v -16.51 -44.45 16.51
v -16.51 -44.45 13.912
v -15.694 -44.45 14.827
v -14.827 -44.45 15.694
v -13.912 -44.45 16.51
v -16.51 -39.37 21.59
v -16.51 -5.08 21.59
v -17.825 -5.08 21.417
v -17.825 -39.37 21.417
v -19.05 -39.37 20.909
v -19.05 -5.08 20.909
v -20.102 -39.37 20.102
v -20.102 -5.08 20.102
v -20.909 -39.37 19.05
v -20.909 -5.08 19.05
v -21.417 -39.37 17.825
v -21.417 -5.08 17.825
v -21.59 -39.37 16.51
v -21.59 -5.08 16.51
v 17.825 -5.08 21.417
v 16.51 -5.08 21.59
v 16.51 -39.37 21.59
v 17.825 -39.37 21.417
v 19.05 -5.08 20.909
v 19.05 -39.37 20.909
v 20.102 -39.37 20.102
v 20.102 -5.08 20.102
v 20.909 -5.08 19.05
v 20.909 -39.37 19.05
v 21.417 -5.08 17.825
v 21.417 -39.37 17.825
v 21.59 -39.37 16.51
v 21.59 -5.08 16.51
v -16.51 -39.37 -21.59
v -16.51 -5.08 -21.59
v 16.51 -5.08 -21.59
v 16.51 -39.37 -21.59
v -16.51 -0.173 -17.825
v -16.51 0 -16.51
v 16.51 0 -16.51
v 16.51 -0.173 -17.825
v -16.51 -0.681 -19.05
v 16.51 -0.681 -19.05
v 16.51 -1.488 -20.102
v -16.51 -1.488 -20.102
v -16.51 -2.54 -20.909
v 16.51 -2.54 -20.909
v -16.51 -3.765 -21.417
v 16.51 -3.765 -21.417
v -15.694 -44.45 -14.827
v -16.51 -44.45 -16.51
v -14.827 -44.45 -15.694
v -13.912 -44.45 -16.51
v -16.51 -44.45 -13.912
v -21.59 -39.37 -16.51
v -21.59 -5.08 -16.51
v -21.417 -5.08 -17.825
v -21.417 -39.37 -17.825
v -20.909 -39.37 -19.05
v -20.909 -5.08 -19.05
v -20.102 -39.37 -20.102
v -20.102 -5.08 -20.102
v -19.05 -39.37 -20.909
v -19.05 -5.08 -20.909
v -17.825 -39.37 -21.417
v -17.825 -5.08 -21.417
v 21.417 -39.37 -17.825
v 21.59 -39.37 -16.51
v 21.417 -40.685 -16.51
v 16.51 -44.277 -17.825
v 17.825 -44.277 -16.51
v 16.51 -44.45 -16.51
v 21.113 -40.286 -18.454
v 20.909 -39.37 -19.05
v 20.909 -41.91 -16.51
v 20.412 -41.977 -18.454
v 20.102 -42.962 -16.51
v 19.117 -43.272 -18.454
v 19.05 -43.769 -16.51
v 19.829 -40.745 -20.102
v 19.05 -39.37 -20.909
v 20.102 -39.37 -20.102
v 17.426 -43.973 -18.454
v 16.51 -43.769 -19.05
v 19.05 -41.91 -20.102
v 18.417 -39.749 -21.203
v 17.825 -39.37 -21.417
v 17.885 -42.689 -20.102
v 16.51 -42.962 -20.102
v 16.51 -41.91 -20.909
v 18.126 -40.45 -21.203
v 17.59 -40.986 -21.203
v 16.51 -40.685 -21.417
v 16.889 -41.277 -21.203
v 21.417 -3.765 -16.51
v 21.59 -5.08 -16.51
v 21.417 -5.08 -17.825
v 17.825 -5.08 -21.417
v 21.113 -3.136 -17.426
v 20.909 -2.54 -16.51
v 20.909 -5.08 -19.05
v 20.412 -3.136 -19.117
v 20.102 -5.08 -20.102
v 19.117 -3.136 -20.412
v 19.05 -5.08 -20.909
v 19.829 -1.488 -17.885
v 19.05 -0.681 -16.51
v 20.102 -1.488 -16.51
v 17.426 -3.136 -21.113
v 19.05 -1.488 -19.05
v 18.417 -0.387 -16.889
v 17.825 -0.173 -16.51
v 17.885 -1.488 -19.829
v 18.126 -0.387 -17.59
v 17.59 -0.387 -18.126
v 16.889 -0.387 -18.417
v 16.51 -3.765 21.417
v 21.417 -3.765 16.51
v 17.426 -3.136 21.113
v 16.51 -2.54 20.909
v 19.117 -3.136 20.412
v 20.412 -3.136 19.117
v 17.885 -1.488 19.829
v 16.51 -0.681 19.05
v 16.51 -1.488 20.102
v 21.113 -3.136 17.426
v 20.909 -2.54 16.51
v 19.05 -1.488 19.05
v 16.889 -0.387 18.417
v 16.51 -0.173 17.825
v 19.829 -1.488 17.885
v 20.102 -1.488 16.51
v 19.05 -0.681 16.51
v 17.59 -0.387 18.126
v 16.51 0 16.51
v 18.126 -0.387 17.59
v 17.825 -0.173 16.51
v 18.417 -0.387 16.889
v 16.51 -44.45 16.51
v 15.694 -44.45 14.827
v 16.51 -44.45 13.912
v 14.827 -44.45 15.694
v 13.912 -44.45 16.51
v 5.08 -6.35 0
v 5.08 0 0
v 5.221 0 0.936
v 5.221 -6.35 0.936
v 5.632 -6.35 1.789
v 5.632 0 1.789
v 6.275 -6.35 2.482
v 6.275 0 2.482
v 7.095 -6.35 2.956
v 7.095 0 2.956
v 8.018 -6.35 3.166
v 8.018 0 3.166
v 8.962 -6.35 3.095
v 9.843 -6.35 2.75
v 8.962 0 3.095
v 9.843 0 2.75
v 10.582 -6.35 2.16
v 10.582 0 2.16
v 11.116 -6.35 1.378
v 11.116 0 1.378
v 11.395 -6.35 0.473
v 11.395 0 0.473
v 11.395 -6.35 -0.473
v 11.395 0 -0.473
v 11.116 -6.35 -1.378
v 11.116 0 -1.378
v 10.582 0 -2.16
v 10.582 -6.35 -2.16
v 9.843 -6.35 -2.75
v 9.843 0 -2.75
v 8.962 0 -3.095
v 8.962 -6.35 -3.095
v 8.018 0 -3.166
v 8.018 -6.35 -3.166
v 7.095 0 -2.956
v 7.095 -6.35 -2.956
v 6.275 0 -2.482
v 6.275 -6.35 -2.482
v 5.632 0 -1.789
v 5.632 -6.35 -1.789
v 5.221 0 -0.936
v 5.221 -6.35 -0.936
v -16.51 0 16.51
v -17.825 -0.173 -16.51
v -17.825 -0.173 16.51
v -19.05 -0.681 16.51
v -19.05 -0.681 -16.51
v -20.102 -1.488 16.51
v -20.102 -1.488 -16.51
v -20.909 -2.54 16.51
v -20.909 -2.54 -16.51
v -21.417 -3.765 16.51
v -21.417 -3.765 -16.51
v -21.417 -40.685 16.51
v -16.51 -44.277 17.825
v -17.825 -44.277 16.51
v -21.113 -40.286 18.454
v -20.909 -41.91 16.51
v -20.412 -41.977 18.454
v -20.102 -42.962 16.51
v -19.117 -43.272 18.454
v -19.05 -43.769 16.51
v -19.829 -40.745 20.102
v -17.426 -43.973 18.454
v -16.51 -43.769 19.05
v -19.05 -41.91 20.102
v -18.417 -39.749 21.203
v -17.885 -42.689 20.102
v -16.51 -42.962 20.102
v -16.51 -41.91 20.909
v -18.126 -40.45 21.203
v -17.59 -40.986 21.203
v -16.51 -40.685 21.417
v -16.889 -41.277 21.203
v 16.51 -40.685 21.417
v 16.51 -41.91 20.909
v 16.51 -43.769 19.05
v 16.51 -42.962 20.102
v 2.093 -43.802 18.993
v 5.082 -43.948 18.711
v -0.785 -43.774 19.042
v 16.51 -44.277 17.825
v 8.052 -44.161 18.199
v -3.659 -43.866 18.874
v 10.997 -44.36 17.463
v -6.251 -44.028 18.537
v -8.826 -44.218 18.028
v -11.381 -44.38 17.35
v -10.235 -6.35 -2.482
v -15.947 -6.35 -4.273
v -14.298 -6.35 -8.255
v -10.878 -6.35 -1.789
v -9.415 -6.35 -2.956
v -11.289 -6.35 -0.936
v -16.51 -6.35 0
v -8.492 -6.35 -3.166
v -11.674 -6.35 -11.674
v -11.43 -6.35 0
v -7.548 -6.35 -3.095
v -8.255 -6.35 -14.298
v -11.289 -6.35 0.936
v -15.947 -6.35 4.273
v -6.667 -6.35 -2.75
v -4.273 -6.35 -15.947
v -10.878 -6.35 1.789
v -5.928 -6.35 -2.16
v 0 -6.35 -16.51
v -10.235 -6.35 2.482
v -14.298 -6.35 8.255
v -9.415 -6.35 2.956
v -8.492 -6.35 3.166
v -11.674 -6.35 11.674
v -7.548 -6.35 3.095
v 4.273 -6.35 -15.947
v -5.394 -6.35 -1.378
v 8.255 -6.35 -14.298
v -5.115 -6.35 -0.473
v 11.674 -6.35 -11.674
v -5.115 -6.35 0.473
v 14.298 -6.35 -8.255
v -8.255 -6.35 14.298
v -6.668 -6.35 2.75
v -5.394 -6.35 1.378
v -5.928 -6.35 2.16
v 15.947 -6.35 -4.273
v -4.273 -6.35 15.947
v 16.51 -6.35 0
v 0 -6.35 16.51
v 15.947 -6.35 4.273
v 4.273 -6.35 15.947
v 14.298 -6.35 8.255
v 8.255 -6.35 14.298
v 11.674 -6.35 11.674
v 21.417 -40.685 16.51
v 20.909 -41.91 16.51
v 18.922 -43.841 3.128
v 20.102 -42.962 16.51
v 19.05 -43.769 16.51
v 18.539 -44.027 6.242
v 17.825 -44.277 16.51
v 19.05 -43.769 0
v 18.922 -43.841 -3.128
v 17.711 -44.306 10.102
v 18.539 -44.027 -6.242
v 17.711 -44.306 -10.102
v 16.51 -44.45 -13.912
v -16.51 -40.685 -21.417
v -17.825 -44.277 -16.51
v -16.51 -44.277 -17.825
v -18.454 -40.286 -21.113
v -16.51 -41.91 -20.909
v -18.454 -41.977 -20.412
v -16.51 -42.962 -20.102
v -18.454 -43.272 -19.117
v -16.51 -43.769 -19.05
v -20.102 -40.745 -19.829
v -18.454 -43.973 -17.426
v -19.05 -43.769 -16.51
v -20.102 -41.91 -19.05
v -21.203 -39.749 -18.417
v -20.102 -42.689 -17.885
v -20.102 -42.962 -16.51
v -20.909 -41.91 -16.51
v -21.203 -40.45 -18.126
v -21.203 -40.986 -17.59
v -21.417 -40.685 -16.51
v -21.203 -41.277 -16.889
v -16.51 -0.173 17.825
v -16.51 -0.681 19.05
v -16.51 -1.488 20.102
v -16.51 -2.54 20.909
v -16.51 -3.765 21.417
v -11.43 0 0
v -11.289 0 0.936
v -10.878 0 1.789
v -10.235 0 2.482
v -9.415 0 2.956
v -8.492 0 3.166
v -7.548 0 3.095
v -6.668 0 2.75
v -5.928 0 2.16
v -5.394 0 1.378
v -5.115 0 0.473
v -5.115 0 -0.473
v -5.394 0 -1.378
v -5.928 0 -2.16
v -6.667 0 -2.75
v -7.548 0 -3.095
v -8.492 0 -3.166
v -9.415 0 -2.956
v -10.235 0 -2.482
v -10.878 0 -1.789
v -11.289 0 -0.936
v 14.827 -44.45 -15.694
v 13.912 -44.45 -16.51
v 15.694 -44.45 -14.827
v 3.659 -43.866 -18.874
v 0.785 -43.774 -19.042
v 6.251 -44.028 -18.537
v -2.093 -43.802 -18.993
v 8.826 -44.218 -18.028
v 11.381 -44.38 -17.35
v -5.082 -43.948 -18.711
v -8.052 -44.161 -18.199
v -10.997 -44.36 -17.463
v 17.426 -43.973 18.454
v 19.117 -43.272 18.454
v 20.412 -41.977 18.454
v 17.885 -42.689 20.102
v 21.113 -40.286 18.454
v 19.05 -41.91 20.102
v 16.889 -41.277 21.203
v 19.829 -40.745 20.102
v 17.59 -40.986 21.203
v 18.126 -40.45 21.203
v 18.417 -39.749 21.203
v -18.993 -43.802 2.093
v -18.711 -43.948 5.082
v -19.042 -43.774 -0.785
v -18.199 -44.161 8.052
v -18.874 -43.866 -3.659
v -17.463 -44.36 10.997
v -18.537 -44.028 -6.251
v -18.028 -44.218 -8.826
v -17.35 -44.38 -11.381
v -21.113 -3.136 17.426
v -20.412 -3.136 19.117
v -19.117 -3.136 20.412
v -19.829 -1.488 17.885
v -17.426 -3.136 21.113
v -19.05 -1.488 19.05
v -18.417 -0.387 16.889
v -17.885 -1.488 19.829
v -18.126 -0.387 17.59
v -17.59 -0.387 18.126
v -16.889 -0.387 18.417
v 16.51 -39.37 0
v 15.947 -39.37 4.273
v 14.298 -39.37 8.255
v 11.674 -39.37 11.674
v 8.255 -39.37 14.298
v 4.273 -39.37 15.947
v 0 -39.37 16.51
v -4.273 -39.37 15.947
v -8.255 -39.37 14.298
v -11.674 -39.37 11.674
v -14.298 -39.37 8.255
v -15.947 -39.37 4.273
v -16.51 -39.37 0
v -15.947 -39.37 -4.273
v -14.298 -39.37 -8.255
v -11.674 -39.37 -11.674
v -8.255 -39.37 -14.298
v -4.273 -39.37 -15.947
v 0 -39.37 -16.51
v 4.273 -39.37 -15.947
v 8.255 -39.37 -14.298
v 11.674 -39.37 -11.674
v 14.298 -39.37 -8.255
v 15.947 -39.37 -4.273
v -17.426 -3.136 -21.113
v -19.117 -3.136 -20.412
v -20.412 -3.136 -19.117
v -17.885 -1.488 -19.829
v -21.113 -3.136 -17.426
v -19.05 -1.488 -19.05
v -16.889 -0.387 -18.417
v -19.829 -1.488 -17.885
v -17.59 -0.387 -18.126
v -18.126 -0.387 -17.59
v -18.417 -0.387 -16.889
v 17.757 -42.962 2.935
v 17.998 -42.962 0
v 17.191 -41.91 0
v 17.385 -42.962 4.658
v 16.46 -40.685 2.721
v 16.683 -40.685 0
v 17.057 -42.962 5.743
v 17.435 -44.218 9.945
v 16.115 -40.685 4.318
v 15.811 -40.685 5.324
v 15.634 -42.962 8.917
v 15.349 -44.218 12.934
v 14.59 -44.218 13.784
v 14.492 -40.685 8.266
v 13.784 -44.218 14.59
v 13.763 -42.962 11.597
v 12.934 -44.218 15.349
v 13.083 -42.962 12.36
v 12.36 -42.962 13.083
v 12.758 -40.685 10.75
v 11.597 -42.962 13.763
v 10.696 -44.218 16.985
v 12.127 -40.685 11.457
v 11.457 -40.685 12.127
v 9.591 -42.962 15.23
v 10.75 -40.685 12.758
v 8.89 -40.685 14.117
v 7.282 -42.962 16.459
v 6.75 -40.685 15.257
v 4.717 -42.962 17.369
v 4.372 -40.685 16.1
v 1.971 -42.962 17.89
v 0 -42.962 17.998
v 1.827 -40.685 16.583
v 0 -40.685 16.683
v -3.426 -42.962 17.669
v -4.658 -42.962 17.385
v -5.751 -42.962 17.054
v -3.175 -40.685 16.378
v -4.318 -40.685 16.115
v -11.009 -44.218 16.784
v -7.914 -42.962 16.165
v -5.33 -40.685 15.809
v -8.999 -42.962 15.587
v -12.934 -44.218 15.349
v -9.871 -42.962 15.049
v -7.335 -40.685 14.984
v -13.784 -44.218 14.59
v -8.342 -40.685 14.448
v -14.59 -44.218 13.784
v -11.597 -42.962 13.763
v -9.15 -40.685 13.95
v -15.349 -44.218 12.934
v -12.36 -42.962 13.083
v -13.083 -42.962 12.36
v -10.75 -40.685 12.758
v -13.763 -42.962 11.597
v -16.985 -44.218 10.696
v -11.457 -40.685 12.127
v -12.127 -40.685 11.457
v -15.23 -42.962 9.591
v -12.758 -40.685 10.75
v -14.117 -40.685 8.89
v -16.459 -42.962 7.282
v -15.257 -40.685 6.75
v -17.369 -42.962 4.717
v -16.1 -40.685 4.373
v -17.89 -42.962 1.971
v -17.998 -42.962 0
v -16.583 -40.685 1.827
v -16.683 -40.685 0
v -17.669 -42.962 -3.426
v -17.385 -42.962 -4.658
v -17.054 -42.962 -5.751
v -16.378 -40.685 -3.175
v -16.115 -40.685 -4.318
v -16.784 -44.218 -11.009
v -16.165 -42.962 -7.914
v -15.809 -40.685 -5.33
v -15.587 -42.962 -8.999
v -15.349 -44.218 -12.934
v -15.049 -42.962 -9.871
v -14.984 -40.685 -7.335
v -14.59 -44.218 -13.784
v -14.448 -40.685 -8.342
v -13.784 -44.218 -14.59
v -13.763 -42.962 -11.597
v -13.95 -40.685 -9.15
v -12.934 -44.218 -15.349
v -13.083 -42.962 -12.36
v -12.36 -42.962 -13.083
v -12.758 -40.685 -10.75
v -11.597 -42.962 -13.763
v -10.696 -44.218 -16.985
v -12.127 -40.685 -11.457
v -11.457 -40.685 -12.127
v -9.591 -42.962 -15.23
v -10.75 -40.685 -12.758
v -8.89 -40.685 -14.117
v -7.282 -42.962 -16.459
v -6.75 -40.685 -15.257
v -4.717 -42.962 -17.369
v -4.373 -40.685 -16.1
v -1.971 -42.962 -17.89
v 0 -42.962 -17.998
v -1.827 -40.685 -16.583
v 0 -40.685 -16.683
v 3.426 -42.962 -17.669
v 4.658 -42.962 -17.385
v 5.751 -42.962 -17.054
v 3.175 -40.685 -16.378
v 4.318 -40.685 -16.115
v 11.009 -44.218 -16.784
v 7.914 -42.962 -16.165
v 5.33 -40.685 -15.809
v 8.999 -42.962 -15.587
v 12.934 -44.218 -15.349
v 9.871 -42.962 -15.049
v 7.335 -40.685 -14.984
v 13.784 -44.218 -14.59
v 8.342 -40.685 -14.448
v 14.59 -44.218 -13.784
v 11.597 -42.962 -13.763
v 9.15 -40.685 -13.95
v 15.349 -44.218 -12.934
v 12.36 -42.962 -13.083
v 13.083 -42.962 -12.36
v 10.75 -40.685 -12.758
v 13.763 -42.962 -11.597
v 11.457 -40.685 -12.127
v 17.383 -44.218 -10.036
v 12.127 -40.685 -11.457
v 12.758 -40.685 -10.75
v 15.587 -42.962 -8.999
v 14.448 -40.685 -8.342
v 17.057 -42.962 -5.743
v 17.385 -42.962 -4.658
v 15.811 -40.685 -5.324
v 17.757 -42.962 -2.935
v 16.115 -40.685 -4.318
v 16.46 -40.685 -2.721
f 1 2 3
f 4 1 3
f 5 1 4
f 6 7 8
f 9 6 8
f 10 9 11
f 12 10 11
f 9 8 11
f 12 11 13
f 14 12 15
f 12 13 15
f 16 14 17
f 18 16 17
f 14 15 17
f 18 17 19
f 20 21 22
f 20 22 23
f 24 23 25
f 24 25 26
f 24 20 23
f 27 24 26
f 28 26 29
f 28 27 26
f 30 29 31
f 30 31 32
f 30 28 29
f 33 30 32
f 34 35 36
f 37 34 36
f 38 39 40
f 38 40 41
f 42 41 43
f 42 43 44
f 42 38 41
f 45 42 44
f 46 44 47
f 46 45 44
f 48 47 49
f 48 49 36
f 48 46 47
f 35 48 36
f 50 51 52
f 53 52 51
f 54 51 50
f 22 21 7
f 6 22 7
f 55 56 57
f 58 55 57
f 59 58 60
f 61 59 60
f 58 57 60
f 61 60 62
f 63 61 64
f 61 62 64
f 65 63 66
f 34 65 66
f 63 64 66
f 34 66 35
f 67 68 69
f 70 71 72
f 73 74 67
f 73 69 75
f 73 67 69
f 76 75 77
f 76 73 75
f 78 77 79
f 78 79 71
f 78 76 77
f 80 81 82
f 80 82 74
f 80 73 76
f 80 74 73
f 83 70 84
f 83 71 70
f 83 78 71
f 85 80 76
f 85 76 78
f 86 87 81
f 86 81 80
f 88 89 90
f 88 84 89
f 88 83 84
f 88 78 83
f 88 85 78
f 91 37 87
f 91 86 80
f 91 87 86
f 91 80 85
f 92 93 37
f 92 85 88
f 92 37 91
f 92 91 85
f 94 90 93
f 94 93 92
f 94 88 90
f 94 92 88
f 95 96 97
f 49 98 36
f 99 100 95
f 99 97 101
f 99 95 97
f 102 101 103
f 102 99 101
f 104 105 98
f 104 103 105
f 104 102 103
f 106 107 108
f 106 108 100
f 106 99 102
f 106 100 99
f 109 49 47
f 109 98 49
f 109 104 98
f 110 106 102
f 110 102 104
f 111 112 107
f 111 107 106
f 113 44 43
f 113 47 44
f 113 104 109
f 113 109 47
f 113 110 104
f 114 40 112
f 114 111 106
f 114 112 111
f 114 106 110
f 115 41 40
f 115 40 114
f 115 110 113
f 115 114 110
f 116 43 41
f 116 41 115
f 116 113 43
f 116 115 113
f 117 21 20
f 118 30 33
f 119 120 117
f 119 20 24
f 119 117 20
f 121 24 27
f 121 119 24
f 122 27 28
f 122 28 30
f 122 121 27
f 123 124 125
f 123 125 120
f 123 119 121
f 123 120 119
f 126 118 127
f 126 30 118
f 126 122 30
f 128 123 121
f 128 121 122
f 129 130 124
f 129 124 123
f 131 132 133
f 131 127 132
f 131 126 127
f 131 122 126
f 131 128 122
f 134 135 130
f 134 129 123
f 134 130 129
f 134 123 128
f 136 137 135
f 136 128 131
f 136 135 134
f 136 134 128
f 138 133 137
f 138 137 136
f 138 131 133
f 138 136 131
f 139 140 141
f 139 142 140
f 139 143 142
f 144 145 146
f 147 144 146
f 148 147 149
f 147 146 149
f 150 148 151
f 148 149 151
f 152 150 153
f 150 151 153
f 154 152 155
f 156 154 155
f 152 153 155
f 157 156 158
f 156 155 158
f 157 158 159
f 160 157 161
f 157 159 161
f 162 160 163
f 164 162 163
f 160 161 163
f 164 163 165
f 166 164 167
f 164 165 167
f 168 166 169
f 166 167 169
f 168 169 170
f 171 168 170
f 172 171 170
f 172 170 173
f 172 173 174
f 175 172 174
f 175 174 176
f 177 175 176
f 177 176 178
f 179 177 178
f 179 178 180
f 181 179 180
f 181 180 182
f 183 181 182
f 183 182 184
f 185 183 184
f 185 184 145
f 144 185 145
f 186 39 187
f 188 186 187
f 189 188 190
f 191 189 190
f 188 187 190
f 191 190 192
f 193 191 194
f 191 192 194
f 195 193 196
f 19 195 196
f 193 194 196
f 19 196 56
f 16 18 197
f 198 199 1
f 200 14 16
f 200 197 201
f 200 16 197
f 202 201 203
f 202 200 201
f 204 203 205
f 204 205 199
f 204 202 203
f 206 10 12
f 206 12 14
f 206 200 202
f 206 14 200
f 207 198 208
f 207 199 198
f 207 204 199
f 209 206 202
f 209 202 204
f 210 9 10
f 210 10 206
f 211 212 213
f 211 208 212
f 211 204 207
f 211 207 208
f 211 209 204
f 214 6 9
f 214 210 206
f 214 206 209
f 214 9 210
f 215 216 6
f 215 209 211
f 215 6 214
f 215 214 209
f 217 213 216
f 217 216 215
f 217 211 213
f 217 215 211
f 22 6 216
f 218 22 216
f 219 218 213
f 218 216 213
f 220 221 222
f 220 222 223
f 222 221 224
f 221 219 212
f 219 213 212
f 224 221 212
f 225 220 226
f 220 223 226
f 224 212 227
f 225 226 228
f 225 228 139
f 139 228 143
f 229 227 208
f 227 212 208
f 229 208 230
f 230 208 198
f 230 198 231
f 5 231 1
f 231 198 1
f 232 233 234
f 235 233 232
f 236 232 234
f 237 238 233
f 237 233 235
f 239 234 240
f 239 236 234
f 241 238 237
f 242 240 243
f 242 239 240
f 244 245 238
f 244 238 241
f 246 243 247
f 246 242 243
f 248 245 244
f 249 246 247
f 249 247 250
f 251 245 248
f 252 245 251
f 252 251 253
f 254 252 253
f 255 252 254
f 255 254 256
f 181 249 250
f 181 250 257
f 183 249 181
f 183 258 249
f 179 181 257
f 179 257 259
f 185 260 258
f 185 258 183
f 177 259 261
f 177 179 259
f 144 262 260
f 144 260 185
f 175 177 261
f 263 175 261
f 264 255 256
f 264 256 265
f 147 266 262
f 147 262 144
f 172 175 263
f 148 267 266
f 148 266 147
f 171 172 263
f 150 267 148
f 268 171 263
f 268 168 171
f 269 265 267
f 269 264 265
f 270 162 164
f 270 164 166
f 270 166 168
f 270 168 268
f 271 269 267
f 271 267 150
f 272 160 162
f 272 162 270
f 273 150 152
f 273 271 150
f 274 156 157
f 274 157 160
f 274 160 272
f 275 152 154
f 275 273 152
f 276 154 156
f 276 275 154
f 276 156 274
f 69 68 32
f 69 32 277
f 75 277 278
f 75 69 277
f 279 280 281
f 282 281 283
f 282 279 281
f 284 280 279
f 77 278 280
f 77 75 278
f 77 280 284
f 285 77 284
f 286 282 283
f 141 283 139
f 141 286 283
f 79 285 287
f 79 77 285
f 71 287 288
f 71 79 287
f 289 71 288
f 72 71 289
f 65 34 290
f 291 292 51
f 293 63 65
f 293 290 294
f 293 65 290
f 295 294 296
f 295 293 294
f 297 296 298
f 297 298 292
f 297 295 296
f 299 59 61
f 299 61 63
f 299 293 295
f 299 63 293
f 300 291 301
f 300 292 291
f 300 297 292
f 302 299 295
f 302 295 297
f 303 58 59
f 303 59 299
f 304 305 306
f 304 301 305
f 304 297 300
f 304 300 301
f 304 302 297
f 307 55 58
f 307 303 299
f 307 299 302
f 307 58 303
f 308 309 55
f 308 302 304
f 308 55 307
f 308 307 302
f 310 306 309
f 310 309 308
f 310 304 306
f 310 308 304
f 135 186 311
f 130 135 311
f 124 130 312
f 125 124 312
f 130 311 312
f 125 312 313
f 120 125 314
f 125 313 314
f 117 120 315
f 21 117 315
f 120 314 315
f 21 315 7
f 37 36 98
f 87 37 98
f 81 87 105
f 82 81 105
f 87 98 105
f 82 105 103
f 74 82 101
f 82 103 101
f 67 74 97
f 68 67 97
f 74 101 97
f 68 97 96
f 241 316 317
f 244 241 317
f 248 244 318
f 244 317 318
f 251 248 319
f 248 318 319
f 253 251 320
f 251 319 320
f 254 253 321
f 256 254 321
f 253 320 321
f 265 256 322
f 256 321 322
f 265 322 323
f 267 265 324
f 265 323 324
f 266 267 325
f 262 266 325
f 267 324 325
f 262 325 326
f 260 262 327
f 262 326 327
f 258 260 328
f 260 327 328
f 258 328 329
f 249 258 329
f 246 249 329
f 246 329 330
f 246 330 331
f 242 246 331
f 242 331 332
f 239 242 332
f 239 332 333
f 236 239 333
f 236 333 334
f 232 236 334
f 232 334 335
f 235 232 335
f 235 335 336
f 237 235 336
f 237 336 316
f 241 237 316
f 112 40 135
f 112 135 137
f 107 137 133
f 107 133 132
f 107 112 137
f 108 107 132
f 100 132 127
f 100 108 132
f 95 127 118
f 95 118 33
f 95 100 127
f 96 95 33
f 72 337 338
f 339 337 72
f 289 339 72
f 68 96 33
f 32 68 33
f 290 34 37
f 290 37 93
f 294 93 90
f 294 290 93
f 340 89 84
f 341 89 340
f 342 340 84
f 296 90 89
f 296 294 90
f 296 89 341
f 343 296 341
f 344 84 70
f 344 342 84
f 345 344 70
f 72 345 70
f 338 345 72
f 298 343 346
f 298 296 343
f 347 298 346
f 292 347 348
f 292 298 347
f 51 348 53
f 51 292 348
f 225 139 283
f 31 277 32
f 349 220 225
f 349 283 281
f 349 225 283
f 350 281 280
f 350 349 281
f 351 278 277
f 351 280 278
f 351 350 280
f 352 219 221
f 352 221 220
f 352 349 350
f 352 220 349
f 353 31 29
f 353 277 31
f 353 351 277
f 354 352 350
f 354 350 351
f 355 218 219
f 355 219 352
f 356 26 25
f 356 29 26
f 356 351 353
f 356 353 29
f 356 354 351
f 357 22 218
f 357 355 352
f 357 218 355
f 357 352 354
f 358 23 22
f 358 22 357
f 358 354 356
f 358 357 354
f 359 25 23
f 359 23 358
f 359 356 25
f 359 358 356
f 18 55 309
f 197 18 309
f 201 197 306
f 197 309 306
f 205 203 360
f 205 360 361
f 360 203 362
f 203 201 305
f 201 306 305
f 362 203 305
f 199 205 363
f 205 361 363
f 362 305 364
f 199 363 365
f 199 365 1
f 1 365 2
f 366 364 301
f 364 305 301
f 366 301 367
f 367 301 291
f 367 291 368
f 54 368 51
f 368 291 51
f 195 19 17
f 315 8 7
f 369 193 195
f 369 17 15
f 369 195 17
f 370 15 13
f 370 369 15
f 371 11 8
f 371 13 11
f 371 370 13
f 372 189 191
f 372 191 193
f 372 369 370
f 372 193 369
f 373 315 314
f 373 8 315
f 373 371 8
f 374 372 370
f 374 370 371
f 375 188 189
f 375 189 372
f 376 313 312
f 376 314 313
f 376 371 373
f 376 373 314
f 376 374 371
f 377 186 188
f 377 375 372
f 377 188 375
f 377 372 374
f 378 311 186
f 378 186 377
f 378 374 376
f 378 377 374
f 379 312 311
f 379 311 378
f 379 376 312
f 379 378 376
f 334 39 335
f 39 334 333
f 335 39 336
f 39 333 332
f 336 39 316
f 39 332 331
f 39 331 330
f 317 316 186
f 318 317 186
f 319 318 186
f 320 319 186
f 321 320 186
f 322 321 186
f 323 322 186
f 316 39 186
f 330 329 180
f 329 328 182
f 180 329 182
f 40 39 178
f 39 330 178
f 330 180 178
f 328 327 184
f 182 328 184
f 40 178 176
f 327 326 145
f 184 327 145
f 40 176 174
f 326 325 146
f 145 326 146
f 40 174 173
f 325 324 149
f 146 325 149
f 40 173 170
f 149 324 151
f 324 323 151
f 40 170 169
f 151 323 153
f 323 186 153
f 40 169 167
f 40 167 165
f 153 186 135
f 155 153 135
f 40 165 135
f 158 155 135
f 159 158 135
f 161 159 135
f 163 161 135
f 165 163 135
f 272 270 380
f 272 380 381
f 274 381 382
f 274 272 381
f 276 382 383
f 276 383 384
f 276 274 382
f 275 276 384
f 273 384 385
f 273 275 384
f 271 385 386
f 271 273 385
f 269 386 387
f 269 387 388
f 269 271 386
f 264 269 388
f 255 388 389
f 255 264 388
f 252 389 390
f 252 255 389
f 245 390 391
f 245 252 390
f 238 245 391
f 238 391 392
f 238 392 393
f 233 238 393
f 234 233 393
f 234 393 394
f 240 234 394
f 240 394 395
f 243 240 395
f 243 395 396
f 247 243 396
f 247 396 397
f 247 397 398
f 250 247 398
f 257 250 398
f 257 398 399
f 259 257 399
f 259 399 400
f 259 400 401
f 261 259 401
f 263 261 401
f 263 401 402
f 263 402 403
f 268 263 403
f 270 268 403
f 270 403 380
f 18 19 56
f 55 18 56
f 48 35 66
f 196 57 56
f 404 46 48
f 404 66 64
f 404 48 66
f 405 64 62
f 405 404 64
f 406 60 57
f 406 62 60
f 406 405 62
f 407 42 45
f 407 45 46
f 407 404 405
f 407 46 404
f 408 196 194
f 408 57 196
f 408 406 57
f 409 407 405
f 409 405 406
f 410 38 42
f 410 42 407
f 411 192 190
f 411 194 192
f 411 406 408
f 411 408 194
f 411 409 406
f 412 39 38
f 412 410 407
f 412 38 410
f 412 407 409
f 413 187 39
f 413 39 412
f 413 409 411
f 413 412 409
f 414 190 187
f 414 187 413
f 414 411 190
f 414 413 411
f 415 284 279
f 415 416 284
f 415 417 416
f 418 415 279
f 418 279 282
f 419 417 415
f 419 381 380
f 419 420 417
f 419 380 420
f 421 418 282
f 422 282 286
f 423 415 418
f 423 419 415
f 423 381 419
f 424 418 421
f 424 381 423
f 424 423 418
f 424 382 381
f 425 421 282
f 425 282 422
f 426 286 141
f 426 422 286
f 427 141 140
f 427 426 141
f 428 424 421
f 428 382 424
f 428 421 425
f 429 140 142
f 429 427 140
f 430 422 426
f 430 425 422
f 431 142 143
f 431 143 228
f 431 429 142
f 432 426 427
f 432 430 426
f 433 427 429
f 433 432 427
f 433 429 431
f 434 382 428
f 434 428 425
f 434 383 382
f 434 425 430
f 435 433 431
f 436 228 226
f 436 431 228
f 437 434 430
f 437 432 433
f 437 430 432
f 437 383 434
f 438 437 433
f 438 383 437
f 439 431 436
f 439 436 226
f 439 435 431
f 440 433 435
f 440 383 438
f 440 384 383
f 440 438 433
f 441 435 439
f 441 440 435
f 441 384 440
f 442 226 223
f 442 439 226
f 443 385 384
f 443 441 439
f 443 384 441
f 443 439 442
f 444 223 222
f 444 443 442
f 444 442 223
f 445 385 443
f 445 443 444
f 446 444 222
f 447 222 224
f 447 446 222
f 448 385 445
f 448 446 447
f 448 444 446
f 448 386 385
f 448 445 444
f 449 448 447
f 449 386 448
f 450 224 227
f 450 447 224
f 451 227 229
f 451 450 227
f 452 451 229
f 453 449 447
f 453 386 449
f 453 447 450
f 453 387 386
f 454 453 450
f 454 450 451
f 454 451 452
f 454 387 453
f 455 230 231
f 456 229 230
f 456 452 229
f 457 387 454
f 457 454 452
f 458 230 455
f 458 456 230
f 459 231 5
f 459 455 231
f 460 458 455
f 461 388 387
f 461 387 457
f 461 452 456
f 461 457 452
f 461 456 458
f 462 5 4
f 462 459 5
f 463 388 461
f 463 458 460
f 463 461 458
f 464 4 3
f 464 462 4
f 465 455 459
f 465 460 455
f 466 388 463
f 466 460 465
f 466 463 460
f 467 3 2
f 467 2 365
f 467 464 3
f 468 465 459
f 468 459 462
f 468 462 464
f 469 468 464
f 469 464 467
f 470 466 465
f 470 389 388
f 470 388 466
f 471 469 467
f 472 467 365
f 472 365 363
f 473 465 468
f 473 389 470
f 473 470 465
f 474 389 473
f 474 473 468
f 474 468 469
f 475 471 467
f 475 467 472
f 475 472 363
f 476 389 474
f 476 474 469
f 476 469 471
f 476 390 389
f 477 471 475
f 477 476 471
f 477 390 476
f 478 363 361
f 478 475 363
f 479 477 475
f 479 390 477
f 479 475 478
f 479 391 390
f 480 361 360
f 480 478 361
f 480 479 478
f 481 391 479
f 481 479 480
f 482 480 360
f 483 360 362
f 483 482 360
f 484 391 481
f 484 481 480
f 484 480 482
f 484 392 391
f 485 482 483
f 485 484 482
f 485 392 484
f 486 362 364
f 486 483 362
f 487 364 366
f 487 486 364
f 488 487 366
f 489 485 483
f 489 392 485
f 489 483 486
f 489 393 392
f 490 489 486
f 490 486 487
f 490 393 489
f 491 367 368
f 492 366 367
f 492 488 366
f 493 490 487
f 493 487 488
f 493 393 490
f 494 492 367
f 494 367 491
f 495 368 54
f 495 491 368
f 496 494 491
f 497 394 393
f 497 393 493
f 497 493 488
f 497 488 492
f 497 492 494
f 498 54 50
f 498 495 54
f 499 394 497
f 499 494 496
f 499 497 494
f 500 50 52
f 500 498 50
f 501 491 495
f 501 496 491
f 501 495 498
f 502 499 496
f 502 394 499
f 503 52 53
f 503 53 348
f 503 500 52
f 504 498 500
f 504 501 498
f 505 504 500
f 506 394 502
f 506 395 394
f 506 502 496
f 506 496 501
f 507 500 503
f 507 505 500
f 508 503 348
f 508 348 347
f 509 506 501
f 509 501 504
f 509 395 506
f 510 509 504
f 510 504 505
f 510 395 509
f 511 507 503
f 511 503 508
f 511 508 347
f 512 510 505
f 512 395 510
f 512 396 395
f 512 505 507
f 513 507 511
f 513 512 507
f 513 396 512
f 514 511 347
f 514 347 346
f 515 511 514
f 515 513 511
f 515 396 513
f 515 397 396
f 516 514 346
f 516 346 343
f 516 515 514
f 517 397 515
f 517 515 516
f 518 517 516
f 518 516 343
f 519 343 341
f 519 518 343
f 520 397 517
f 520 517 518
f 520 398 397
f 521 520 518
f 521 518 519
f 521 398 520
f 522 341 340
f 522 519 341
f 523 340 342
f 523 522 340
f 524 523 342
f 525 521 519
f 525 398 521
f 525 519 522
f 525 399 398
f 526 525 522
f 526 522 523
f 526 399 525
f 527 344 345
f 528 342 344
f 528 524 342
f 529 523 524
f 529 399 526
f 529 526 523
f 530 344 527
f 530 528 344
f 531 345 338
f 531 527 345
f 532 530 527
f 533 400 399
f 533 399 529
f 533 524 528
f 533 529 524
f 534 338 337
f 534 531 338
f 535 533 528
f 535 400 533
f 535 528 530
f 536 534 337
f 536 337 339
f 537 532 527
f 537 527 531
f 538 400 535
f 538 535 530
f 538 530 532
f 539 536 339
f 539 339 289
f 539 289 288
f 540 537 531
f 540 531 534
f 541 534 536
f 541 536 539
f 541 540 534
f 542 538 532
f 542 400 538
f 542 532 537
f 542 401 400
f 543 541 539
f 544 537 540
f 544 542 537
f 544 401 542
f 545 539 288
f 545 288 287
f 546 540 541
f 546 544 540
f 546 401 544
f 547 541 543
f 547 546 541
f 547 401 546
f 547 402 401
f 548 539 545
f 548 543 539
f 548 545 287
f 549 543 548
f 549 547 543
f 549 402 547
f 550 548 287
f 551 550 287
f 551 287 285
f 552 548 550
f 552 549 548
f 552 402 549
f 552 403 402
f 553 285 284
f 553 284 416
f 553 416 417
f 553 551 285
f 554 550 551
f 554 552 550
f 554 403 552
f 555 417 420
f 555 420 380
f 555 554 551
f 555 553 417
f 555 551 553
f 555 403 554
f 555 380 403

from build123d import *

# Parameters (mm, degrees)
F0_R         = 16.51
F1_DEPTH     = 6.35
F2_DEPTH     = 44.45
F3_T1_DEPTH  = 34.29
F3_T3_DEPTH  = 33.02
F3_T5_DEPTH  = 33.02
F3_S9_W      = 5.08
F3_S9_H      = 5.08
F3_T10_DEPTH = 5.08
F3_S15_W     = 5.08
F3_S15_H     = 5.08
F3_T16_DEPTH = 5.08
F3_S21_W     = 5.08
F3_S21_H     = 5.08
F3_T22_DEPTH = 5.08
F3_S27_W     = 5.08
F3_S27_H     = 5.08
F3_T28_DEPTH = 5.08
F3_S33_W     = 5.08
F3_S33_H     = 5.08
F3_T34_DEPTH = 5.08
F3_S39_W     = 5.08
F3_S39_H     = 5.08
F3_T40_DEPTH = 5.08
F3_S45_W     = 5.08
F3_S45_H     = 5.08
F3_T46_DEPTH = 5.08
F3_S51_W     = 5.08
F3_S51_H     = 5.08
F3_T52_DEPTH = 5.08
F4_R         = 3.175
F5_DEPTH     = 25.4


# Not quite as in the source:
# - a fillet or chamfer that OpenCascade refuses, or shapes differently, is made with other operations: its cross-section is extruded or revolved along the edge and cut away or added


with BuildPart() as f1:
    # F0 (on Front) → F1 (new body)
    with BuildSketch(Plane.XZ):
        Circle(F0_R)
    extrude(amount=F1_DEPTH)

    # F0 (on Front) → F2 (join)
    with BuildSketch(Plane.XZ):
        Polygon((21.59, 21.59), (0, 21.59), (-21.59, 21.59), (-21.59, 0), (-21.59, -21.59), (21.59, -21.59), align=None)
        Circle(F0_R, mode=Mode.SUBTRACT)
    extrude(amount=F2_DEPTH)

    # F3: fillet of radius 5.08 on 13 edges, made by hand

    # F3_s2 → F3_t1 (cut)
    with BuildSketch(Plane.XZ.offset(5.08)):
        with BuildLine():
            ThreePointArc((16.51, 21.59), (20.1021024484, 20.1021024484), (21.59, 16.51))
            Line((21.59, 16.51), (21.59, 21.59))
            Line((21.59, 21.59), (16.51, 21.59))
        make_face()
        with BuildLine():
            ThreePointArc((-16.51, 21.59), (-20.1021024484, 20.1021024484), (-21.59, 16.51))
            Line((-21.59, 16.51), (-21.59, 21.59))
            Line((-21.59, 21.59), (-16.51, 21.59))
        make_face()
        with BuildLine():
            ThreePointArc((-21.59, -16.51), (-20.1021024484, -20.1021024484), (-16.51, -21.59))
            Line((-16.51, -21.59), (-21.59, -21.59))
            Line((-21.59, -21.59), (-21.59, -16.51))
        make_face()
        with BuildLine():
            ThreePointArc((16.51, -21.59), (20.1021024484, -20.1021024484), (21.59, -16.51))
            Line((21.59, -16.51), (21.59, -21.59))
            Line((21.59, -21.59), (16.51, -21.59))
        make_face()
    extrude(amount=F3_T1_DEPTH, mode=Mode.SUBTRACT)

    # F3_s4 → F3_t3 (cut)
    with BuildSketch(Plane.YZ.offset(-16.51)):
        with BuildLine():
            ThreePointArc((0, -16.51), (-1.4878975516, -20.1021024484), (-5.08, -21.59))
            Line((-5.08, -21.59), (0, -21.59))
            Line((0, -21.59), (0, -16.51))
        make_face()
        with BuildLine():
            ThreePointArc((0, 16.51), (-1.4878975516, 20.1021024484), (-5.08, 21.59))
            Line((-5.08, 21.59), (0, 21.59))
            Line((0, 21.59), (0, 16.51))
        make_face()
        with BuildLine():
            ThreePointArc((-39.37, -21.59), (-42.9621024484, -20.1021024484), (-44.45, -16.51))
            Line((-44.45, -16.51), (-44.45, -21.59))
            Line((-44.45, -21.59), (-39.37, -21.59))
        make_face()
        with BuildLine():
            ThreePointArc((-39.37, 21.59), (-42.9621024484, 20.1021024484), (-44.45, 16.51))
            Line((-44.45, 16.51), (-44.45, 21.59))
            Line((-44.45, 21.59), (-39.37, 21.59))
        make_face()
    extrude(amount=F3_T3_DEPTH, mode=Mode.SUBTRACT)

    # F3_s6 → F3_t5 (cut)
    with BuildSketch(Plane.XY.offset(-16.51)):
        with BuildLine():
            ThreePointArc((16.51, 0), (20.1021024484, -1.4878975516), (21.59, -5.08))
            Line((21.59, -5.08), (21.59, 0))
            Line((21.59, 0), (16.51, 0))
        make_face()
        with BuildLine():
            ThreePointArc((-16.51, 0), (-20.1021024484, -1.4878975516), (-21.59, -5.08))
            Line((-21.59, -5.08), (-21.59, 0))
            Line((-21.59, 0), (-16.51, 0))
        make_face()
        with BuildLine():
            ThreePointArc((21.59, -39.37), (20.1021024484, -42.9621024484), (16.51, -44.45))
            Line((16.51, -44.45), (21.59, -44.45))
            Line((21.59, -44.45), (21.59, -39.37))
        make_face()
        with BuildLine():
            ThreePointArc((-21.59, -39.37), (-20.1021024484, -42.9621024484), (-16.51, -44.45))
            Line((-16.51, -44.45), (-21.59, -44.45))
            Line((-21.59, -44.45), (-21.59, -39.37))
        make_face()
    extrude(amount=F3_T5_DEPTH, mode=Mode.SUBTRACT)


with BuildPart() as f3_tool8:
    # F3_s9 → F3_t10 (new body)
    with BuildSketch(Plane.XZ.offset(5.08)):
        with Locations((19.05, 19.05)):
            Rectangle(F3_S9_W, F3_S9_H)
    extrude(amount=-F3_T10_DEPTH)

    # F3_s11 → F3_t12 (revolve, cut)
    with BuildSketch(Plane(origin=(16.51, -5.08, 16.51), x_dir=(-0.7071067812, 0, -0.7071067812), z_dir=(0.7071067812, 0, -0.7071067812))):
        with BuildLine():
            ThreePointArc((0, -5.08), (5.08, 0), (0, 5.08))
            Line((0, 5.08), (0, -5.08))
        make_face()
    revolve(axis=Axis((16.51, -5.08, 16.51), (0, 1, 0)), mode=Mode.SUBTRACT)


with BuildPart() as f1_1:
    add(f1.part)

    # F3_t7: cut F3_tool8
    add(f3_tool8.part, mode=Mode.SUBTRACT)


with BuildPart() as f3_tool14:
    # F3_s15 → F3_t16 (new body)
    with BuildSketch(Plane.XY.offset(16.51)):
        with Locations((19.05, -41.91)):
            Rectangle(F3_S15_W, F3_S15_H)
    extrude(amount=F3_T16_DEPTH)

    # F3_s17 → F3_t18 (revolve, cut)
    with BuildSketch(Plane(origin=(16.51, -39.37, 16.51), x_dir=(-0.7071067812, 0.7071067812, 0), z_dir=(0.7071067812, 0.7071067812, 0))):
        with BuildLine():
            ThreePointArc((0, -5.08), (5.08, 0), (0, 5.08))
            Line((0, 5.08), (0, -5.08))
        make_face()
    revolve(axis=Axis((16.51, -39.37, 16.51), (0, 0, 1)), mode=Mode.SUBTRACT)


with BuildPart() as f1_2:
    add(f1_1.part)

    # F3_t13: cut F3_tool14
    add(f3_tool14.part, mode=Mode.SUBTRACT)


with BuildPart() as f3_tool20:
    # F3_s21 → F3_t22 (new body)
    with BuildSketch(Plane.XZ.offset(5.08)):
        with Locations((-19.05, 19.05)):
            Rectangle(F3_S21_W, F3_S21_H)
    extrude(amount=-F3_T22_DEPTH)

    # F3_s23 → F3_t24 (revolve, cut)
    with BuildSketch(Plane(origin=(-16.51, -5.08, 16.51), x_dir=(0.7071067812, 0, -0.7071067812), z_dir=(0.7071067812, 0, 0.7071067812))):
        with BuildLine():
            ThreePointArc((0, -5.08), (5.08, 0), (0, 5.08))
            Line((0, 5.08), (0, -5.08))
        make_face()
    revolve(axis=Axis((-16.51, -5.08, 16.51), (0, 1, 0)), mode=Mode.SUBTRACT)


with BuildPart() as f1_3:
    add(f1_2.part)

    # F3_t19: cut F3_tool20
    add(f3_tool20.part, mode=Mode.SUBTRACT)


with BuildPart() as f3_tool26:
    # F3_s27 → F3_t28 (new body)
    with BuildSketch(Plane.XY.offset(16.51)):
        with Locations((-19.05, -41.91)):
            Rectangle(F3_S27_W, F3_S27_H)
    extrude(amount=F3_T28_DEPTH)

    # F3_s29 → F3_t30 (revolve, cut)
    with BuildSketch(Plane(origin=(-16.51, -39.37, 16.51), x_dir=(0.7071067812, 0.7071067812, 0), z_dir=(0.7071067812, -0.7071067812, 0))):
        with BuildLine():
            ThreePointArc((0, -5.08), (5.08, 0), (0, 5.08))
            Line((0, 5.08), (0, -5.08))
        make_face()
    revolve(axis=Axis((-16.51, -39.37, 16.51), (0, 0, 1)), mode=Mode.SUBTRACT)


with BuildPart() as f1_4:
    add(f1_3.part)

    # F3_t25: cut F3_tool26
    add(f3_tool26.part, mode=Mode.SUBTRACT)


with BuildPart() as f3_tool32:
    # F3_s33 → F3_t34 (new body)
    with BuildSketch(Plane.XZ.offset(5.08)):
        with Locations((-19.05, -19.05)):
            Rectangle(F3_S33_W, F3_S33_H)
    extrude(amount=-F3_T34_DEPTH)

    # F3_s35 → F3_t36 (revolve, cut)
    with BuildSketch(Plane(origin=(-16.51, -5.08, -16.51), x_dir=(0.7071067812, 0, 0.7071067812), z_dir=(-0.7071067812, 0, 0.7071067812))):
        with BuildLine():
            ThreePointArc((0, -5.08), (5.08, 0), (0, 5.08))
            Line((0, 5.08), (0, -5.08))
        make_face()
    revolve(axis=Axis((-16.51, -5.08, -16.51), (0, 1, 0)), mode=Mode.SUBTRACT)


with BuildPart() as f1_5:
    add(f1_4.part)

    # F3_t31: cut F3_tool32
    add(f3_tool32.part, mode=Mode.SUBTRACT)


with BuildPart() as f3_tool38:
    # F3_s39 → F3_t40 (new body)
    with BuildSketch(Plane.YZ.offset(-16.51)):
        with Locations((-41.91, -19.05)):
            Rectangle(F3_S39_W, F3_S39_H)
    extrude(amount=-F3_T40_DEPTH)

    # F3_s41 → F3_t42 (revolve, cut)
    with BuildSketch(Plane(origin=(-16.51, -39.37, -16.51), x_dir=(0, 0.7071067812, 0.7071067812), z_dir=(0, -0.7071067812, 0.7071067812))):
        with BuildLine():
            ThreePointArc((0, -5.08), (5.08, 0), (0, 5.08))
            Line((0, 5.08), (0, -5.08))
        make_face()
    revolve(axis=Axis((-16.51, -39.37, -16.51), (-1, 0, 0)), mode=Mode.SUBTRACT)


with BuildPart() as f1_6:
    add(f1_5.part)

    # F3_t37: cut F3_tool38
    add(f3_tool38.part, mode=Mode.SUBTRACT)


with BuildPart() as f3_tool44:
    # F3_s45 → F3_t46 (new body)
    with BuildSketch(Plane.XZ.offset(5.08)):
        with Locations((19.05, -19.05)):
            Rectangle(F3_S45_W, F3_S45_H)
    extrude(amount=-F3_T46_DEPTH)

    # F3_s47 → F3_t48 (revolve, cut)
    with BuildSketch(Plane(origin=(16.51, -5.08, -16.51), x_dir=(-0.7071067812, 0, 0.7071067812), z_dir=(-0.7071067812, 0, -0.7071067812))):
        with BuildLine():
            ThreePointArc((0, -5.08), (5.08, 0), (0, 5.08))
            Line((0, 5.08), (0, -5.08))
        make_face()
    revolve(axis=Axis((16.51, -5.08, -16.51), (0, 1, 0)), mode=Mode.SUBTRACT)


with BuildPart() as f1_7:
    add(f1_6.part)

    # F3_t43: cut F3_tool44
    add(f3_tool44.part, mode=Mode.SUBTRACT)


with BuildPart() as f3_tool50:
    # F3_s51 → F3_t52 (new body)
    with BuildSketch(Plane.XY.offset(-16.51)):
        with Locations((19.05, -41.91)):
            Rectangle(F3_S51_W, F3_S51_H)
    extrude(amount=-F3_T52_DEPTH)

    # F3_s53 → F3_t54 (revolve, cut)
    with BuildSketch(Plane(origin=(16.51, -39.37, -16.51), x_dir=(-0.7071067812, 0.7071067812, 0), z_dir=(-0.7071067812, -0.7071067812, 0))):
        with BuildLine():
            ThreePointArc((0, -5.08), (5.08, 0), (0, 5.08))
            Line((0, 5.08), (0, -5.08))
        make_face()
    revolve(axis=Axis((16.51, -39.37, -16.51), (0, 0, -1)), mode=Mode.SUBTRACT)


with BuildPart() as f1_8:
    add(f1_7.part)

    # F3_t49: cut F3_tool50
    add(f3_tool50.part, mode=Mode.SUBTRACT)

    # F3_s55 → F3_t56 (revolve, cut)
    with BuildSketch(Plane.XY):
        with BuildLine():
            ThreePointArc((21.59, -44.45), (17.9978975516, -42.9621024484), (16.51, -39.37))
            Line((16.51, -39.37), (16.51, -44.45))
            Line((16.51, -44.45), (21.59, -44.45))
        make_face()
    revolve(axis=Axis((0, -44.45, 0), (0, -1, 0)), mode=Mode.SUBTRACT)

    # F4 (on face) → F5 (cut)
    with BuildSketch(Plane(origin=(0, 0, 0), x_dir=(-1, 0, 0), z_dir=(0, 1, 0))):
        with Locations((-8.255, 0)):
            Circle(F4_R)
        with Locations((8.255, 0)):
            Circle(F4_R)
    extrude(amount=-F5_DEPTH, mode=Mode.SUBTRACT)


solid = f1_8.part
